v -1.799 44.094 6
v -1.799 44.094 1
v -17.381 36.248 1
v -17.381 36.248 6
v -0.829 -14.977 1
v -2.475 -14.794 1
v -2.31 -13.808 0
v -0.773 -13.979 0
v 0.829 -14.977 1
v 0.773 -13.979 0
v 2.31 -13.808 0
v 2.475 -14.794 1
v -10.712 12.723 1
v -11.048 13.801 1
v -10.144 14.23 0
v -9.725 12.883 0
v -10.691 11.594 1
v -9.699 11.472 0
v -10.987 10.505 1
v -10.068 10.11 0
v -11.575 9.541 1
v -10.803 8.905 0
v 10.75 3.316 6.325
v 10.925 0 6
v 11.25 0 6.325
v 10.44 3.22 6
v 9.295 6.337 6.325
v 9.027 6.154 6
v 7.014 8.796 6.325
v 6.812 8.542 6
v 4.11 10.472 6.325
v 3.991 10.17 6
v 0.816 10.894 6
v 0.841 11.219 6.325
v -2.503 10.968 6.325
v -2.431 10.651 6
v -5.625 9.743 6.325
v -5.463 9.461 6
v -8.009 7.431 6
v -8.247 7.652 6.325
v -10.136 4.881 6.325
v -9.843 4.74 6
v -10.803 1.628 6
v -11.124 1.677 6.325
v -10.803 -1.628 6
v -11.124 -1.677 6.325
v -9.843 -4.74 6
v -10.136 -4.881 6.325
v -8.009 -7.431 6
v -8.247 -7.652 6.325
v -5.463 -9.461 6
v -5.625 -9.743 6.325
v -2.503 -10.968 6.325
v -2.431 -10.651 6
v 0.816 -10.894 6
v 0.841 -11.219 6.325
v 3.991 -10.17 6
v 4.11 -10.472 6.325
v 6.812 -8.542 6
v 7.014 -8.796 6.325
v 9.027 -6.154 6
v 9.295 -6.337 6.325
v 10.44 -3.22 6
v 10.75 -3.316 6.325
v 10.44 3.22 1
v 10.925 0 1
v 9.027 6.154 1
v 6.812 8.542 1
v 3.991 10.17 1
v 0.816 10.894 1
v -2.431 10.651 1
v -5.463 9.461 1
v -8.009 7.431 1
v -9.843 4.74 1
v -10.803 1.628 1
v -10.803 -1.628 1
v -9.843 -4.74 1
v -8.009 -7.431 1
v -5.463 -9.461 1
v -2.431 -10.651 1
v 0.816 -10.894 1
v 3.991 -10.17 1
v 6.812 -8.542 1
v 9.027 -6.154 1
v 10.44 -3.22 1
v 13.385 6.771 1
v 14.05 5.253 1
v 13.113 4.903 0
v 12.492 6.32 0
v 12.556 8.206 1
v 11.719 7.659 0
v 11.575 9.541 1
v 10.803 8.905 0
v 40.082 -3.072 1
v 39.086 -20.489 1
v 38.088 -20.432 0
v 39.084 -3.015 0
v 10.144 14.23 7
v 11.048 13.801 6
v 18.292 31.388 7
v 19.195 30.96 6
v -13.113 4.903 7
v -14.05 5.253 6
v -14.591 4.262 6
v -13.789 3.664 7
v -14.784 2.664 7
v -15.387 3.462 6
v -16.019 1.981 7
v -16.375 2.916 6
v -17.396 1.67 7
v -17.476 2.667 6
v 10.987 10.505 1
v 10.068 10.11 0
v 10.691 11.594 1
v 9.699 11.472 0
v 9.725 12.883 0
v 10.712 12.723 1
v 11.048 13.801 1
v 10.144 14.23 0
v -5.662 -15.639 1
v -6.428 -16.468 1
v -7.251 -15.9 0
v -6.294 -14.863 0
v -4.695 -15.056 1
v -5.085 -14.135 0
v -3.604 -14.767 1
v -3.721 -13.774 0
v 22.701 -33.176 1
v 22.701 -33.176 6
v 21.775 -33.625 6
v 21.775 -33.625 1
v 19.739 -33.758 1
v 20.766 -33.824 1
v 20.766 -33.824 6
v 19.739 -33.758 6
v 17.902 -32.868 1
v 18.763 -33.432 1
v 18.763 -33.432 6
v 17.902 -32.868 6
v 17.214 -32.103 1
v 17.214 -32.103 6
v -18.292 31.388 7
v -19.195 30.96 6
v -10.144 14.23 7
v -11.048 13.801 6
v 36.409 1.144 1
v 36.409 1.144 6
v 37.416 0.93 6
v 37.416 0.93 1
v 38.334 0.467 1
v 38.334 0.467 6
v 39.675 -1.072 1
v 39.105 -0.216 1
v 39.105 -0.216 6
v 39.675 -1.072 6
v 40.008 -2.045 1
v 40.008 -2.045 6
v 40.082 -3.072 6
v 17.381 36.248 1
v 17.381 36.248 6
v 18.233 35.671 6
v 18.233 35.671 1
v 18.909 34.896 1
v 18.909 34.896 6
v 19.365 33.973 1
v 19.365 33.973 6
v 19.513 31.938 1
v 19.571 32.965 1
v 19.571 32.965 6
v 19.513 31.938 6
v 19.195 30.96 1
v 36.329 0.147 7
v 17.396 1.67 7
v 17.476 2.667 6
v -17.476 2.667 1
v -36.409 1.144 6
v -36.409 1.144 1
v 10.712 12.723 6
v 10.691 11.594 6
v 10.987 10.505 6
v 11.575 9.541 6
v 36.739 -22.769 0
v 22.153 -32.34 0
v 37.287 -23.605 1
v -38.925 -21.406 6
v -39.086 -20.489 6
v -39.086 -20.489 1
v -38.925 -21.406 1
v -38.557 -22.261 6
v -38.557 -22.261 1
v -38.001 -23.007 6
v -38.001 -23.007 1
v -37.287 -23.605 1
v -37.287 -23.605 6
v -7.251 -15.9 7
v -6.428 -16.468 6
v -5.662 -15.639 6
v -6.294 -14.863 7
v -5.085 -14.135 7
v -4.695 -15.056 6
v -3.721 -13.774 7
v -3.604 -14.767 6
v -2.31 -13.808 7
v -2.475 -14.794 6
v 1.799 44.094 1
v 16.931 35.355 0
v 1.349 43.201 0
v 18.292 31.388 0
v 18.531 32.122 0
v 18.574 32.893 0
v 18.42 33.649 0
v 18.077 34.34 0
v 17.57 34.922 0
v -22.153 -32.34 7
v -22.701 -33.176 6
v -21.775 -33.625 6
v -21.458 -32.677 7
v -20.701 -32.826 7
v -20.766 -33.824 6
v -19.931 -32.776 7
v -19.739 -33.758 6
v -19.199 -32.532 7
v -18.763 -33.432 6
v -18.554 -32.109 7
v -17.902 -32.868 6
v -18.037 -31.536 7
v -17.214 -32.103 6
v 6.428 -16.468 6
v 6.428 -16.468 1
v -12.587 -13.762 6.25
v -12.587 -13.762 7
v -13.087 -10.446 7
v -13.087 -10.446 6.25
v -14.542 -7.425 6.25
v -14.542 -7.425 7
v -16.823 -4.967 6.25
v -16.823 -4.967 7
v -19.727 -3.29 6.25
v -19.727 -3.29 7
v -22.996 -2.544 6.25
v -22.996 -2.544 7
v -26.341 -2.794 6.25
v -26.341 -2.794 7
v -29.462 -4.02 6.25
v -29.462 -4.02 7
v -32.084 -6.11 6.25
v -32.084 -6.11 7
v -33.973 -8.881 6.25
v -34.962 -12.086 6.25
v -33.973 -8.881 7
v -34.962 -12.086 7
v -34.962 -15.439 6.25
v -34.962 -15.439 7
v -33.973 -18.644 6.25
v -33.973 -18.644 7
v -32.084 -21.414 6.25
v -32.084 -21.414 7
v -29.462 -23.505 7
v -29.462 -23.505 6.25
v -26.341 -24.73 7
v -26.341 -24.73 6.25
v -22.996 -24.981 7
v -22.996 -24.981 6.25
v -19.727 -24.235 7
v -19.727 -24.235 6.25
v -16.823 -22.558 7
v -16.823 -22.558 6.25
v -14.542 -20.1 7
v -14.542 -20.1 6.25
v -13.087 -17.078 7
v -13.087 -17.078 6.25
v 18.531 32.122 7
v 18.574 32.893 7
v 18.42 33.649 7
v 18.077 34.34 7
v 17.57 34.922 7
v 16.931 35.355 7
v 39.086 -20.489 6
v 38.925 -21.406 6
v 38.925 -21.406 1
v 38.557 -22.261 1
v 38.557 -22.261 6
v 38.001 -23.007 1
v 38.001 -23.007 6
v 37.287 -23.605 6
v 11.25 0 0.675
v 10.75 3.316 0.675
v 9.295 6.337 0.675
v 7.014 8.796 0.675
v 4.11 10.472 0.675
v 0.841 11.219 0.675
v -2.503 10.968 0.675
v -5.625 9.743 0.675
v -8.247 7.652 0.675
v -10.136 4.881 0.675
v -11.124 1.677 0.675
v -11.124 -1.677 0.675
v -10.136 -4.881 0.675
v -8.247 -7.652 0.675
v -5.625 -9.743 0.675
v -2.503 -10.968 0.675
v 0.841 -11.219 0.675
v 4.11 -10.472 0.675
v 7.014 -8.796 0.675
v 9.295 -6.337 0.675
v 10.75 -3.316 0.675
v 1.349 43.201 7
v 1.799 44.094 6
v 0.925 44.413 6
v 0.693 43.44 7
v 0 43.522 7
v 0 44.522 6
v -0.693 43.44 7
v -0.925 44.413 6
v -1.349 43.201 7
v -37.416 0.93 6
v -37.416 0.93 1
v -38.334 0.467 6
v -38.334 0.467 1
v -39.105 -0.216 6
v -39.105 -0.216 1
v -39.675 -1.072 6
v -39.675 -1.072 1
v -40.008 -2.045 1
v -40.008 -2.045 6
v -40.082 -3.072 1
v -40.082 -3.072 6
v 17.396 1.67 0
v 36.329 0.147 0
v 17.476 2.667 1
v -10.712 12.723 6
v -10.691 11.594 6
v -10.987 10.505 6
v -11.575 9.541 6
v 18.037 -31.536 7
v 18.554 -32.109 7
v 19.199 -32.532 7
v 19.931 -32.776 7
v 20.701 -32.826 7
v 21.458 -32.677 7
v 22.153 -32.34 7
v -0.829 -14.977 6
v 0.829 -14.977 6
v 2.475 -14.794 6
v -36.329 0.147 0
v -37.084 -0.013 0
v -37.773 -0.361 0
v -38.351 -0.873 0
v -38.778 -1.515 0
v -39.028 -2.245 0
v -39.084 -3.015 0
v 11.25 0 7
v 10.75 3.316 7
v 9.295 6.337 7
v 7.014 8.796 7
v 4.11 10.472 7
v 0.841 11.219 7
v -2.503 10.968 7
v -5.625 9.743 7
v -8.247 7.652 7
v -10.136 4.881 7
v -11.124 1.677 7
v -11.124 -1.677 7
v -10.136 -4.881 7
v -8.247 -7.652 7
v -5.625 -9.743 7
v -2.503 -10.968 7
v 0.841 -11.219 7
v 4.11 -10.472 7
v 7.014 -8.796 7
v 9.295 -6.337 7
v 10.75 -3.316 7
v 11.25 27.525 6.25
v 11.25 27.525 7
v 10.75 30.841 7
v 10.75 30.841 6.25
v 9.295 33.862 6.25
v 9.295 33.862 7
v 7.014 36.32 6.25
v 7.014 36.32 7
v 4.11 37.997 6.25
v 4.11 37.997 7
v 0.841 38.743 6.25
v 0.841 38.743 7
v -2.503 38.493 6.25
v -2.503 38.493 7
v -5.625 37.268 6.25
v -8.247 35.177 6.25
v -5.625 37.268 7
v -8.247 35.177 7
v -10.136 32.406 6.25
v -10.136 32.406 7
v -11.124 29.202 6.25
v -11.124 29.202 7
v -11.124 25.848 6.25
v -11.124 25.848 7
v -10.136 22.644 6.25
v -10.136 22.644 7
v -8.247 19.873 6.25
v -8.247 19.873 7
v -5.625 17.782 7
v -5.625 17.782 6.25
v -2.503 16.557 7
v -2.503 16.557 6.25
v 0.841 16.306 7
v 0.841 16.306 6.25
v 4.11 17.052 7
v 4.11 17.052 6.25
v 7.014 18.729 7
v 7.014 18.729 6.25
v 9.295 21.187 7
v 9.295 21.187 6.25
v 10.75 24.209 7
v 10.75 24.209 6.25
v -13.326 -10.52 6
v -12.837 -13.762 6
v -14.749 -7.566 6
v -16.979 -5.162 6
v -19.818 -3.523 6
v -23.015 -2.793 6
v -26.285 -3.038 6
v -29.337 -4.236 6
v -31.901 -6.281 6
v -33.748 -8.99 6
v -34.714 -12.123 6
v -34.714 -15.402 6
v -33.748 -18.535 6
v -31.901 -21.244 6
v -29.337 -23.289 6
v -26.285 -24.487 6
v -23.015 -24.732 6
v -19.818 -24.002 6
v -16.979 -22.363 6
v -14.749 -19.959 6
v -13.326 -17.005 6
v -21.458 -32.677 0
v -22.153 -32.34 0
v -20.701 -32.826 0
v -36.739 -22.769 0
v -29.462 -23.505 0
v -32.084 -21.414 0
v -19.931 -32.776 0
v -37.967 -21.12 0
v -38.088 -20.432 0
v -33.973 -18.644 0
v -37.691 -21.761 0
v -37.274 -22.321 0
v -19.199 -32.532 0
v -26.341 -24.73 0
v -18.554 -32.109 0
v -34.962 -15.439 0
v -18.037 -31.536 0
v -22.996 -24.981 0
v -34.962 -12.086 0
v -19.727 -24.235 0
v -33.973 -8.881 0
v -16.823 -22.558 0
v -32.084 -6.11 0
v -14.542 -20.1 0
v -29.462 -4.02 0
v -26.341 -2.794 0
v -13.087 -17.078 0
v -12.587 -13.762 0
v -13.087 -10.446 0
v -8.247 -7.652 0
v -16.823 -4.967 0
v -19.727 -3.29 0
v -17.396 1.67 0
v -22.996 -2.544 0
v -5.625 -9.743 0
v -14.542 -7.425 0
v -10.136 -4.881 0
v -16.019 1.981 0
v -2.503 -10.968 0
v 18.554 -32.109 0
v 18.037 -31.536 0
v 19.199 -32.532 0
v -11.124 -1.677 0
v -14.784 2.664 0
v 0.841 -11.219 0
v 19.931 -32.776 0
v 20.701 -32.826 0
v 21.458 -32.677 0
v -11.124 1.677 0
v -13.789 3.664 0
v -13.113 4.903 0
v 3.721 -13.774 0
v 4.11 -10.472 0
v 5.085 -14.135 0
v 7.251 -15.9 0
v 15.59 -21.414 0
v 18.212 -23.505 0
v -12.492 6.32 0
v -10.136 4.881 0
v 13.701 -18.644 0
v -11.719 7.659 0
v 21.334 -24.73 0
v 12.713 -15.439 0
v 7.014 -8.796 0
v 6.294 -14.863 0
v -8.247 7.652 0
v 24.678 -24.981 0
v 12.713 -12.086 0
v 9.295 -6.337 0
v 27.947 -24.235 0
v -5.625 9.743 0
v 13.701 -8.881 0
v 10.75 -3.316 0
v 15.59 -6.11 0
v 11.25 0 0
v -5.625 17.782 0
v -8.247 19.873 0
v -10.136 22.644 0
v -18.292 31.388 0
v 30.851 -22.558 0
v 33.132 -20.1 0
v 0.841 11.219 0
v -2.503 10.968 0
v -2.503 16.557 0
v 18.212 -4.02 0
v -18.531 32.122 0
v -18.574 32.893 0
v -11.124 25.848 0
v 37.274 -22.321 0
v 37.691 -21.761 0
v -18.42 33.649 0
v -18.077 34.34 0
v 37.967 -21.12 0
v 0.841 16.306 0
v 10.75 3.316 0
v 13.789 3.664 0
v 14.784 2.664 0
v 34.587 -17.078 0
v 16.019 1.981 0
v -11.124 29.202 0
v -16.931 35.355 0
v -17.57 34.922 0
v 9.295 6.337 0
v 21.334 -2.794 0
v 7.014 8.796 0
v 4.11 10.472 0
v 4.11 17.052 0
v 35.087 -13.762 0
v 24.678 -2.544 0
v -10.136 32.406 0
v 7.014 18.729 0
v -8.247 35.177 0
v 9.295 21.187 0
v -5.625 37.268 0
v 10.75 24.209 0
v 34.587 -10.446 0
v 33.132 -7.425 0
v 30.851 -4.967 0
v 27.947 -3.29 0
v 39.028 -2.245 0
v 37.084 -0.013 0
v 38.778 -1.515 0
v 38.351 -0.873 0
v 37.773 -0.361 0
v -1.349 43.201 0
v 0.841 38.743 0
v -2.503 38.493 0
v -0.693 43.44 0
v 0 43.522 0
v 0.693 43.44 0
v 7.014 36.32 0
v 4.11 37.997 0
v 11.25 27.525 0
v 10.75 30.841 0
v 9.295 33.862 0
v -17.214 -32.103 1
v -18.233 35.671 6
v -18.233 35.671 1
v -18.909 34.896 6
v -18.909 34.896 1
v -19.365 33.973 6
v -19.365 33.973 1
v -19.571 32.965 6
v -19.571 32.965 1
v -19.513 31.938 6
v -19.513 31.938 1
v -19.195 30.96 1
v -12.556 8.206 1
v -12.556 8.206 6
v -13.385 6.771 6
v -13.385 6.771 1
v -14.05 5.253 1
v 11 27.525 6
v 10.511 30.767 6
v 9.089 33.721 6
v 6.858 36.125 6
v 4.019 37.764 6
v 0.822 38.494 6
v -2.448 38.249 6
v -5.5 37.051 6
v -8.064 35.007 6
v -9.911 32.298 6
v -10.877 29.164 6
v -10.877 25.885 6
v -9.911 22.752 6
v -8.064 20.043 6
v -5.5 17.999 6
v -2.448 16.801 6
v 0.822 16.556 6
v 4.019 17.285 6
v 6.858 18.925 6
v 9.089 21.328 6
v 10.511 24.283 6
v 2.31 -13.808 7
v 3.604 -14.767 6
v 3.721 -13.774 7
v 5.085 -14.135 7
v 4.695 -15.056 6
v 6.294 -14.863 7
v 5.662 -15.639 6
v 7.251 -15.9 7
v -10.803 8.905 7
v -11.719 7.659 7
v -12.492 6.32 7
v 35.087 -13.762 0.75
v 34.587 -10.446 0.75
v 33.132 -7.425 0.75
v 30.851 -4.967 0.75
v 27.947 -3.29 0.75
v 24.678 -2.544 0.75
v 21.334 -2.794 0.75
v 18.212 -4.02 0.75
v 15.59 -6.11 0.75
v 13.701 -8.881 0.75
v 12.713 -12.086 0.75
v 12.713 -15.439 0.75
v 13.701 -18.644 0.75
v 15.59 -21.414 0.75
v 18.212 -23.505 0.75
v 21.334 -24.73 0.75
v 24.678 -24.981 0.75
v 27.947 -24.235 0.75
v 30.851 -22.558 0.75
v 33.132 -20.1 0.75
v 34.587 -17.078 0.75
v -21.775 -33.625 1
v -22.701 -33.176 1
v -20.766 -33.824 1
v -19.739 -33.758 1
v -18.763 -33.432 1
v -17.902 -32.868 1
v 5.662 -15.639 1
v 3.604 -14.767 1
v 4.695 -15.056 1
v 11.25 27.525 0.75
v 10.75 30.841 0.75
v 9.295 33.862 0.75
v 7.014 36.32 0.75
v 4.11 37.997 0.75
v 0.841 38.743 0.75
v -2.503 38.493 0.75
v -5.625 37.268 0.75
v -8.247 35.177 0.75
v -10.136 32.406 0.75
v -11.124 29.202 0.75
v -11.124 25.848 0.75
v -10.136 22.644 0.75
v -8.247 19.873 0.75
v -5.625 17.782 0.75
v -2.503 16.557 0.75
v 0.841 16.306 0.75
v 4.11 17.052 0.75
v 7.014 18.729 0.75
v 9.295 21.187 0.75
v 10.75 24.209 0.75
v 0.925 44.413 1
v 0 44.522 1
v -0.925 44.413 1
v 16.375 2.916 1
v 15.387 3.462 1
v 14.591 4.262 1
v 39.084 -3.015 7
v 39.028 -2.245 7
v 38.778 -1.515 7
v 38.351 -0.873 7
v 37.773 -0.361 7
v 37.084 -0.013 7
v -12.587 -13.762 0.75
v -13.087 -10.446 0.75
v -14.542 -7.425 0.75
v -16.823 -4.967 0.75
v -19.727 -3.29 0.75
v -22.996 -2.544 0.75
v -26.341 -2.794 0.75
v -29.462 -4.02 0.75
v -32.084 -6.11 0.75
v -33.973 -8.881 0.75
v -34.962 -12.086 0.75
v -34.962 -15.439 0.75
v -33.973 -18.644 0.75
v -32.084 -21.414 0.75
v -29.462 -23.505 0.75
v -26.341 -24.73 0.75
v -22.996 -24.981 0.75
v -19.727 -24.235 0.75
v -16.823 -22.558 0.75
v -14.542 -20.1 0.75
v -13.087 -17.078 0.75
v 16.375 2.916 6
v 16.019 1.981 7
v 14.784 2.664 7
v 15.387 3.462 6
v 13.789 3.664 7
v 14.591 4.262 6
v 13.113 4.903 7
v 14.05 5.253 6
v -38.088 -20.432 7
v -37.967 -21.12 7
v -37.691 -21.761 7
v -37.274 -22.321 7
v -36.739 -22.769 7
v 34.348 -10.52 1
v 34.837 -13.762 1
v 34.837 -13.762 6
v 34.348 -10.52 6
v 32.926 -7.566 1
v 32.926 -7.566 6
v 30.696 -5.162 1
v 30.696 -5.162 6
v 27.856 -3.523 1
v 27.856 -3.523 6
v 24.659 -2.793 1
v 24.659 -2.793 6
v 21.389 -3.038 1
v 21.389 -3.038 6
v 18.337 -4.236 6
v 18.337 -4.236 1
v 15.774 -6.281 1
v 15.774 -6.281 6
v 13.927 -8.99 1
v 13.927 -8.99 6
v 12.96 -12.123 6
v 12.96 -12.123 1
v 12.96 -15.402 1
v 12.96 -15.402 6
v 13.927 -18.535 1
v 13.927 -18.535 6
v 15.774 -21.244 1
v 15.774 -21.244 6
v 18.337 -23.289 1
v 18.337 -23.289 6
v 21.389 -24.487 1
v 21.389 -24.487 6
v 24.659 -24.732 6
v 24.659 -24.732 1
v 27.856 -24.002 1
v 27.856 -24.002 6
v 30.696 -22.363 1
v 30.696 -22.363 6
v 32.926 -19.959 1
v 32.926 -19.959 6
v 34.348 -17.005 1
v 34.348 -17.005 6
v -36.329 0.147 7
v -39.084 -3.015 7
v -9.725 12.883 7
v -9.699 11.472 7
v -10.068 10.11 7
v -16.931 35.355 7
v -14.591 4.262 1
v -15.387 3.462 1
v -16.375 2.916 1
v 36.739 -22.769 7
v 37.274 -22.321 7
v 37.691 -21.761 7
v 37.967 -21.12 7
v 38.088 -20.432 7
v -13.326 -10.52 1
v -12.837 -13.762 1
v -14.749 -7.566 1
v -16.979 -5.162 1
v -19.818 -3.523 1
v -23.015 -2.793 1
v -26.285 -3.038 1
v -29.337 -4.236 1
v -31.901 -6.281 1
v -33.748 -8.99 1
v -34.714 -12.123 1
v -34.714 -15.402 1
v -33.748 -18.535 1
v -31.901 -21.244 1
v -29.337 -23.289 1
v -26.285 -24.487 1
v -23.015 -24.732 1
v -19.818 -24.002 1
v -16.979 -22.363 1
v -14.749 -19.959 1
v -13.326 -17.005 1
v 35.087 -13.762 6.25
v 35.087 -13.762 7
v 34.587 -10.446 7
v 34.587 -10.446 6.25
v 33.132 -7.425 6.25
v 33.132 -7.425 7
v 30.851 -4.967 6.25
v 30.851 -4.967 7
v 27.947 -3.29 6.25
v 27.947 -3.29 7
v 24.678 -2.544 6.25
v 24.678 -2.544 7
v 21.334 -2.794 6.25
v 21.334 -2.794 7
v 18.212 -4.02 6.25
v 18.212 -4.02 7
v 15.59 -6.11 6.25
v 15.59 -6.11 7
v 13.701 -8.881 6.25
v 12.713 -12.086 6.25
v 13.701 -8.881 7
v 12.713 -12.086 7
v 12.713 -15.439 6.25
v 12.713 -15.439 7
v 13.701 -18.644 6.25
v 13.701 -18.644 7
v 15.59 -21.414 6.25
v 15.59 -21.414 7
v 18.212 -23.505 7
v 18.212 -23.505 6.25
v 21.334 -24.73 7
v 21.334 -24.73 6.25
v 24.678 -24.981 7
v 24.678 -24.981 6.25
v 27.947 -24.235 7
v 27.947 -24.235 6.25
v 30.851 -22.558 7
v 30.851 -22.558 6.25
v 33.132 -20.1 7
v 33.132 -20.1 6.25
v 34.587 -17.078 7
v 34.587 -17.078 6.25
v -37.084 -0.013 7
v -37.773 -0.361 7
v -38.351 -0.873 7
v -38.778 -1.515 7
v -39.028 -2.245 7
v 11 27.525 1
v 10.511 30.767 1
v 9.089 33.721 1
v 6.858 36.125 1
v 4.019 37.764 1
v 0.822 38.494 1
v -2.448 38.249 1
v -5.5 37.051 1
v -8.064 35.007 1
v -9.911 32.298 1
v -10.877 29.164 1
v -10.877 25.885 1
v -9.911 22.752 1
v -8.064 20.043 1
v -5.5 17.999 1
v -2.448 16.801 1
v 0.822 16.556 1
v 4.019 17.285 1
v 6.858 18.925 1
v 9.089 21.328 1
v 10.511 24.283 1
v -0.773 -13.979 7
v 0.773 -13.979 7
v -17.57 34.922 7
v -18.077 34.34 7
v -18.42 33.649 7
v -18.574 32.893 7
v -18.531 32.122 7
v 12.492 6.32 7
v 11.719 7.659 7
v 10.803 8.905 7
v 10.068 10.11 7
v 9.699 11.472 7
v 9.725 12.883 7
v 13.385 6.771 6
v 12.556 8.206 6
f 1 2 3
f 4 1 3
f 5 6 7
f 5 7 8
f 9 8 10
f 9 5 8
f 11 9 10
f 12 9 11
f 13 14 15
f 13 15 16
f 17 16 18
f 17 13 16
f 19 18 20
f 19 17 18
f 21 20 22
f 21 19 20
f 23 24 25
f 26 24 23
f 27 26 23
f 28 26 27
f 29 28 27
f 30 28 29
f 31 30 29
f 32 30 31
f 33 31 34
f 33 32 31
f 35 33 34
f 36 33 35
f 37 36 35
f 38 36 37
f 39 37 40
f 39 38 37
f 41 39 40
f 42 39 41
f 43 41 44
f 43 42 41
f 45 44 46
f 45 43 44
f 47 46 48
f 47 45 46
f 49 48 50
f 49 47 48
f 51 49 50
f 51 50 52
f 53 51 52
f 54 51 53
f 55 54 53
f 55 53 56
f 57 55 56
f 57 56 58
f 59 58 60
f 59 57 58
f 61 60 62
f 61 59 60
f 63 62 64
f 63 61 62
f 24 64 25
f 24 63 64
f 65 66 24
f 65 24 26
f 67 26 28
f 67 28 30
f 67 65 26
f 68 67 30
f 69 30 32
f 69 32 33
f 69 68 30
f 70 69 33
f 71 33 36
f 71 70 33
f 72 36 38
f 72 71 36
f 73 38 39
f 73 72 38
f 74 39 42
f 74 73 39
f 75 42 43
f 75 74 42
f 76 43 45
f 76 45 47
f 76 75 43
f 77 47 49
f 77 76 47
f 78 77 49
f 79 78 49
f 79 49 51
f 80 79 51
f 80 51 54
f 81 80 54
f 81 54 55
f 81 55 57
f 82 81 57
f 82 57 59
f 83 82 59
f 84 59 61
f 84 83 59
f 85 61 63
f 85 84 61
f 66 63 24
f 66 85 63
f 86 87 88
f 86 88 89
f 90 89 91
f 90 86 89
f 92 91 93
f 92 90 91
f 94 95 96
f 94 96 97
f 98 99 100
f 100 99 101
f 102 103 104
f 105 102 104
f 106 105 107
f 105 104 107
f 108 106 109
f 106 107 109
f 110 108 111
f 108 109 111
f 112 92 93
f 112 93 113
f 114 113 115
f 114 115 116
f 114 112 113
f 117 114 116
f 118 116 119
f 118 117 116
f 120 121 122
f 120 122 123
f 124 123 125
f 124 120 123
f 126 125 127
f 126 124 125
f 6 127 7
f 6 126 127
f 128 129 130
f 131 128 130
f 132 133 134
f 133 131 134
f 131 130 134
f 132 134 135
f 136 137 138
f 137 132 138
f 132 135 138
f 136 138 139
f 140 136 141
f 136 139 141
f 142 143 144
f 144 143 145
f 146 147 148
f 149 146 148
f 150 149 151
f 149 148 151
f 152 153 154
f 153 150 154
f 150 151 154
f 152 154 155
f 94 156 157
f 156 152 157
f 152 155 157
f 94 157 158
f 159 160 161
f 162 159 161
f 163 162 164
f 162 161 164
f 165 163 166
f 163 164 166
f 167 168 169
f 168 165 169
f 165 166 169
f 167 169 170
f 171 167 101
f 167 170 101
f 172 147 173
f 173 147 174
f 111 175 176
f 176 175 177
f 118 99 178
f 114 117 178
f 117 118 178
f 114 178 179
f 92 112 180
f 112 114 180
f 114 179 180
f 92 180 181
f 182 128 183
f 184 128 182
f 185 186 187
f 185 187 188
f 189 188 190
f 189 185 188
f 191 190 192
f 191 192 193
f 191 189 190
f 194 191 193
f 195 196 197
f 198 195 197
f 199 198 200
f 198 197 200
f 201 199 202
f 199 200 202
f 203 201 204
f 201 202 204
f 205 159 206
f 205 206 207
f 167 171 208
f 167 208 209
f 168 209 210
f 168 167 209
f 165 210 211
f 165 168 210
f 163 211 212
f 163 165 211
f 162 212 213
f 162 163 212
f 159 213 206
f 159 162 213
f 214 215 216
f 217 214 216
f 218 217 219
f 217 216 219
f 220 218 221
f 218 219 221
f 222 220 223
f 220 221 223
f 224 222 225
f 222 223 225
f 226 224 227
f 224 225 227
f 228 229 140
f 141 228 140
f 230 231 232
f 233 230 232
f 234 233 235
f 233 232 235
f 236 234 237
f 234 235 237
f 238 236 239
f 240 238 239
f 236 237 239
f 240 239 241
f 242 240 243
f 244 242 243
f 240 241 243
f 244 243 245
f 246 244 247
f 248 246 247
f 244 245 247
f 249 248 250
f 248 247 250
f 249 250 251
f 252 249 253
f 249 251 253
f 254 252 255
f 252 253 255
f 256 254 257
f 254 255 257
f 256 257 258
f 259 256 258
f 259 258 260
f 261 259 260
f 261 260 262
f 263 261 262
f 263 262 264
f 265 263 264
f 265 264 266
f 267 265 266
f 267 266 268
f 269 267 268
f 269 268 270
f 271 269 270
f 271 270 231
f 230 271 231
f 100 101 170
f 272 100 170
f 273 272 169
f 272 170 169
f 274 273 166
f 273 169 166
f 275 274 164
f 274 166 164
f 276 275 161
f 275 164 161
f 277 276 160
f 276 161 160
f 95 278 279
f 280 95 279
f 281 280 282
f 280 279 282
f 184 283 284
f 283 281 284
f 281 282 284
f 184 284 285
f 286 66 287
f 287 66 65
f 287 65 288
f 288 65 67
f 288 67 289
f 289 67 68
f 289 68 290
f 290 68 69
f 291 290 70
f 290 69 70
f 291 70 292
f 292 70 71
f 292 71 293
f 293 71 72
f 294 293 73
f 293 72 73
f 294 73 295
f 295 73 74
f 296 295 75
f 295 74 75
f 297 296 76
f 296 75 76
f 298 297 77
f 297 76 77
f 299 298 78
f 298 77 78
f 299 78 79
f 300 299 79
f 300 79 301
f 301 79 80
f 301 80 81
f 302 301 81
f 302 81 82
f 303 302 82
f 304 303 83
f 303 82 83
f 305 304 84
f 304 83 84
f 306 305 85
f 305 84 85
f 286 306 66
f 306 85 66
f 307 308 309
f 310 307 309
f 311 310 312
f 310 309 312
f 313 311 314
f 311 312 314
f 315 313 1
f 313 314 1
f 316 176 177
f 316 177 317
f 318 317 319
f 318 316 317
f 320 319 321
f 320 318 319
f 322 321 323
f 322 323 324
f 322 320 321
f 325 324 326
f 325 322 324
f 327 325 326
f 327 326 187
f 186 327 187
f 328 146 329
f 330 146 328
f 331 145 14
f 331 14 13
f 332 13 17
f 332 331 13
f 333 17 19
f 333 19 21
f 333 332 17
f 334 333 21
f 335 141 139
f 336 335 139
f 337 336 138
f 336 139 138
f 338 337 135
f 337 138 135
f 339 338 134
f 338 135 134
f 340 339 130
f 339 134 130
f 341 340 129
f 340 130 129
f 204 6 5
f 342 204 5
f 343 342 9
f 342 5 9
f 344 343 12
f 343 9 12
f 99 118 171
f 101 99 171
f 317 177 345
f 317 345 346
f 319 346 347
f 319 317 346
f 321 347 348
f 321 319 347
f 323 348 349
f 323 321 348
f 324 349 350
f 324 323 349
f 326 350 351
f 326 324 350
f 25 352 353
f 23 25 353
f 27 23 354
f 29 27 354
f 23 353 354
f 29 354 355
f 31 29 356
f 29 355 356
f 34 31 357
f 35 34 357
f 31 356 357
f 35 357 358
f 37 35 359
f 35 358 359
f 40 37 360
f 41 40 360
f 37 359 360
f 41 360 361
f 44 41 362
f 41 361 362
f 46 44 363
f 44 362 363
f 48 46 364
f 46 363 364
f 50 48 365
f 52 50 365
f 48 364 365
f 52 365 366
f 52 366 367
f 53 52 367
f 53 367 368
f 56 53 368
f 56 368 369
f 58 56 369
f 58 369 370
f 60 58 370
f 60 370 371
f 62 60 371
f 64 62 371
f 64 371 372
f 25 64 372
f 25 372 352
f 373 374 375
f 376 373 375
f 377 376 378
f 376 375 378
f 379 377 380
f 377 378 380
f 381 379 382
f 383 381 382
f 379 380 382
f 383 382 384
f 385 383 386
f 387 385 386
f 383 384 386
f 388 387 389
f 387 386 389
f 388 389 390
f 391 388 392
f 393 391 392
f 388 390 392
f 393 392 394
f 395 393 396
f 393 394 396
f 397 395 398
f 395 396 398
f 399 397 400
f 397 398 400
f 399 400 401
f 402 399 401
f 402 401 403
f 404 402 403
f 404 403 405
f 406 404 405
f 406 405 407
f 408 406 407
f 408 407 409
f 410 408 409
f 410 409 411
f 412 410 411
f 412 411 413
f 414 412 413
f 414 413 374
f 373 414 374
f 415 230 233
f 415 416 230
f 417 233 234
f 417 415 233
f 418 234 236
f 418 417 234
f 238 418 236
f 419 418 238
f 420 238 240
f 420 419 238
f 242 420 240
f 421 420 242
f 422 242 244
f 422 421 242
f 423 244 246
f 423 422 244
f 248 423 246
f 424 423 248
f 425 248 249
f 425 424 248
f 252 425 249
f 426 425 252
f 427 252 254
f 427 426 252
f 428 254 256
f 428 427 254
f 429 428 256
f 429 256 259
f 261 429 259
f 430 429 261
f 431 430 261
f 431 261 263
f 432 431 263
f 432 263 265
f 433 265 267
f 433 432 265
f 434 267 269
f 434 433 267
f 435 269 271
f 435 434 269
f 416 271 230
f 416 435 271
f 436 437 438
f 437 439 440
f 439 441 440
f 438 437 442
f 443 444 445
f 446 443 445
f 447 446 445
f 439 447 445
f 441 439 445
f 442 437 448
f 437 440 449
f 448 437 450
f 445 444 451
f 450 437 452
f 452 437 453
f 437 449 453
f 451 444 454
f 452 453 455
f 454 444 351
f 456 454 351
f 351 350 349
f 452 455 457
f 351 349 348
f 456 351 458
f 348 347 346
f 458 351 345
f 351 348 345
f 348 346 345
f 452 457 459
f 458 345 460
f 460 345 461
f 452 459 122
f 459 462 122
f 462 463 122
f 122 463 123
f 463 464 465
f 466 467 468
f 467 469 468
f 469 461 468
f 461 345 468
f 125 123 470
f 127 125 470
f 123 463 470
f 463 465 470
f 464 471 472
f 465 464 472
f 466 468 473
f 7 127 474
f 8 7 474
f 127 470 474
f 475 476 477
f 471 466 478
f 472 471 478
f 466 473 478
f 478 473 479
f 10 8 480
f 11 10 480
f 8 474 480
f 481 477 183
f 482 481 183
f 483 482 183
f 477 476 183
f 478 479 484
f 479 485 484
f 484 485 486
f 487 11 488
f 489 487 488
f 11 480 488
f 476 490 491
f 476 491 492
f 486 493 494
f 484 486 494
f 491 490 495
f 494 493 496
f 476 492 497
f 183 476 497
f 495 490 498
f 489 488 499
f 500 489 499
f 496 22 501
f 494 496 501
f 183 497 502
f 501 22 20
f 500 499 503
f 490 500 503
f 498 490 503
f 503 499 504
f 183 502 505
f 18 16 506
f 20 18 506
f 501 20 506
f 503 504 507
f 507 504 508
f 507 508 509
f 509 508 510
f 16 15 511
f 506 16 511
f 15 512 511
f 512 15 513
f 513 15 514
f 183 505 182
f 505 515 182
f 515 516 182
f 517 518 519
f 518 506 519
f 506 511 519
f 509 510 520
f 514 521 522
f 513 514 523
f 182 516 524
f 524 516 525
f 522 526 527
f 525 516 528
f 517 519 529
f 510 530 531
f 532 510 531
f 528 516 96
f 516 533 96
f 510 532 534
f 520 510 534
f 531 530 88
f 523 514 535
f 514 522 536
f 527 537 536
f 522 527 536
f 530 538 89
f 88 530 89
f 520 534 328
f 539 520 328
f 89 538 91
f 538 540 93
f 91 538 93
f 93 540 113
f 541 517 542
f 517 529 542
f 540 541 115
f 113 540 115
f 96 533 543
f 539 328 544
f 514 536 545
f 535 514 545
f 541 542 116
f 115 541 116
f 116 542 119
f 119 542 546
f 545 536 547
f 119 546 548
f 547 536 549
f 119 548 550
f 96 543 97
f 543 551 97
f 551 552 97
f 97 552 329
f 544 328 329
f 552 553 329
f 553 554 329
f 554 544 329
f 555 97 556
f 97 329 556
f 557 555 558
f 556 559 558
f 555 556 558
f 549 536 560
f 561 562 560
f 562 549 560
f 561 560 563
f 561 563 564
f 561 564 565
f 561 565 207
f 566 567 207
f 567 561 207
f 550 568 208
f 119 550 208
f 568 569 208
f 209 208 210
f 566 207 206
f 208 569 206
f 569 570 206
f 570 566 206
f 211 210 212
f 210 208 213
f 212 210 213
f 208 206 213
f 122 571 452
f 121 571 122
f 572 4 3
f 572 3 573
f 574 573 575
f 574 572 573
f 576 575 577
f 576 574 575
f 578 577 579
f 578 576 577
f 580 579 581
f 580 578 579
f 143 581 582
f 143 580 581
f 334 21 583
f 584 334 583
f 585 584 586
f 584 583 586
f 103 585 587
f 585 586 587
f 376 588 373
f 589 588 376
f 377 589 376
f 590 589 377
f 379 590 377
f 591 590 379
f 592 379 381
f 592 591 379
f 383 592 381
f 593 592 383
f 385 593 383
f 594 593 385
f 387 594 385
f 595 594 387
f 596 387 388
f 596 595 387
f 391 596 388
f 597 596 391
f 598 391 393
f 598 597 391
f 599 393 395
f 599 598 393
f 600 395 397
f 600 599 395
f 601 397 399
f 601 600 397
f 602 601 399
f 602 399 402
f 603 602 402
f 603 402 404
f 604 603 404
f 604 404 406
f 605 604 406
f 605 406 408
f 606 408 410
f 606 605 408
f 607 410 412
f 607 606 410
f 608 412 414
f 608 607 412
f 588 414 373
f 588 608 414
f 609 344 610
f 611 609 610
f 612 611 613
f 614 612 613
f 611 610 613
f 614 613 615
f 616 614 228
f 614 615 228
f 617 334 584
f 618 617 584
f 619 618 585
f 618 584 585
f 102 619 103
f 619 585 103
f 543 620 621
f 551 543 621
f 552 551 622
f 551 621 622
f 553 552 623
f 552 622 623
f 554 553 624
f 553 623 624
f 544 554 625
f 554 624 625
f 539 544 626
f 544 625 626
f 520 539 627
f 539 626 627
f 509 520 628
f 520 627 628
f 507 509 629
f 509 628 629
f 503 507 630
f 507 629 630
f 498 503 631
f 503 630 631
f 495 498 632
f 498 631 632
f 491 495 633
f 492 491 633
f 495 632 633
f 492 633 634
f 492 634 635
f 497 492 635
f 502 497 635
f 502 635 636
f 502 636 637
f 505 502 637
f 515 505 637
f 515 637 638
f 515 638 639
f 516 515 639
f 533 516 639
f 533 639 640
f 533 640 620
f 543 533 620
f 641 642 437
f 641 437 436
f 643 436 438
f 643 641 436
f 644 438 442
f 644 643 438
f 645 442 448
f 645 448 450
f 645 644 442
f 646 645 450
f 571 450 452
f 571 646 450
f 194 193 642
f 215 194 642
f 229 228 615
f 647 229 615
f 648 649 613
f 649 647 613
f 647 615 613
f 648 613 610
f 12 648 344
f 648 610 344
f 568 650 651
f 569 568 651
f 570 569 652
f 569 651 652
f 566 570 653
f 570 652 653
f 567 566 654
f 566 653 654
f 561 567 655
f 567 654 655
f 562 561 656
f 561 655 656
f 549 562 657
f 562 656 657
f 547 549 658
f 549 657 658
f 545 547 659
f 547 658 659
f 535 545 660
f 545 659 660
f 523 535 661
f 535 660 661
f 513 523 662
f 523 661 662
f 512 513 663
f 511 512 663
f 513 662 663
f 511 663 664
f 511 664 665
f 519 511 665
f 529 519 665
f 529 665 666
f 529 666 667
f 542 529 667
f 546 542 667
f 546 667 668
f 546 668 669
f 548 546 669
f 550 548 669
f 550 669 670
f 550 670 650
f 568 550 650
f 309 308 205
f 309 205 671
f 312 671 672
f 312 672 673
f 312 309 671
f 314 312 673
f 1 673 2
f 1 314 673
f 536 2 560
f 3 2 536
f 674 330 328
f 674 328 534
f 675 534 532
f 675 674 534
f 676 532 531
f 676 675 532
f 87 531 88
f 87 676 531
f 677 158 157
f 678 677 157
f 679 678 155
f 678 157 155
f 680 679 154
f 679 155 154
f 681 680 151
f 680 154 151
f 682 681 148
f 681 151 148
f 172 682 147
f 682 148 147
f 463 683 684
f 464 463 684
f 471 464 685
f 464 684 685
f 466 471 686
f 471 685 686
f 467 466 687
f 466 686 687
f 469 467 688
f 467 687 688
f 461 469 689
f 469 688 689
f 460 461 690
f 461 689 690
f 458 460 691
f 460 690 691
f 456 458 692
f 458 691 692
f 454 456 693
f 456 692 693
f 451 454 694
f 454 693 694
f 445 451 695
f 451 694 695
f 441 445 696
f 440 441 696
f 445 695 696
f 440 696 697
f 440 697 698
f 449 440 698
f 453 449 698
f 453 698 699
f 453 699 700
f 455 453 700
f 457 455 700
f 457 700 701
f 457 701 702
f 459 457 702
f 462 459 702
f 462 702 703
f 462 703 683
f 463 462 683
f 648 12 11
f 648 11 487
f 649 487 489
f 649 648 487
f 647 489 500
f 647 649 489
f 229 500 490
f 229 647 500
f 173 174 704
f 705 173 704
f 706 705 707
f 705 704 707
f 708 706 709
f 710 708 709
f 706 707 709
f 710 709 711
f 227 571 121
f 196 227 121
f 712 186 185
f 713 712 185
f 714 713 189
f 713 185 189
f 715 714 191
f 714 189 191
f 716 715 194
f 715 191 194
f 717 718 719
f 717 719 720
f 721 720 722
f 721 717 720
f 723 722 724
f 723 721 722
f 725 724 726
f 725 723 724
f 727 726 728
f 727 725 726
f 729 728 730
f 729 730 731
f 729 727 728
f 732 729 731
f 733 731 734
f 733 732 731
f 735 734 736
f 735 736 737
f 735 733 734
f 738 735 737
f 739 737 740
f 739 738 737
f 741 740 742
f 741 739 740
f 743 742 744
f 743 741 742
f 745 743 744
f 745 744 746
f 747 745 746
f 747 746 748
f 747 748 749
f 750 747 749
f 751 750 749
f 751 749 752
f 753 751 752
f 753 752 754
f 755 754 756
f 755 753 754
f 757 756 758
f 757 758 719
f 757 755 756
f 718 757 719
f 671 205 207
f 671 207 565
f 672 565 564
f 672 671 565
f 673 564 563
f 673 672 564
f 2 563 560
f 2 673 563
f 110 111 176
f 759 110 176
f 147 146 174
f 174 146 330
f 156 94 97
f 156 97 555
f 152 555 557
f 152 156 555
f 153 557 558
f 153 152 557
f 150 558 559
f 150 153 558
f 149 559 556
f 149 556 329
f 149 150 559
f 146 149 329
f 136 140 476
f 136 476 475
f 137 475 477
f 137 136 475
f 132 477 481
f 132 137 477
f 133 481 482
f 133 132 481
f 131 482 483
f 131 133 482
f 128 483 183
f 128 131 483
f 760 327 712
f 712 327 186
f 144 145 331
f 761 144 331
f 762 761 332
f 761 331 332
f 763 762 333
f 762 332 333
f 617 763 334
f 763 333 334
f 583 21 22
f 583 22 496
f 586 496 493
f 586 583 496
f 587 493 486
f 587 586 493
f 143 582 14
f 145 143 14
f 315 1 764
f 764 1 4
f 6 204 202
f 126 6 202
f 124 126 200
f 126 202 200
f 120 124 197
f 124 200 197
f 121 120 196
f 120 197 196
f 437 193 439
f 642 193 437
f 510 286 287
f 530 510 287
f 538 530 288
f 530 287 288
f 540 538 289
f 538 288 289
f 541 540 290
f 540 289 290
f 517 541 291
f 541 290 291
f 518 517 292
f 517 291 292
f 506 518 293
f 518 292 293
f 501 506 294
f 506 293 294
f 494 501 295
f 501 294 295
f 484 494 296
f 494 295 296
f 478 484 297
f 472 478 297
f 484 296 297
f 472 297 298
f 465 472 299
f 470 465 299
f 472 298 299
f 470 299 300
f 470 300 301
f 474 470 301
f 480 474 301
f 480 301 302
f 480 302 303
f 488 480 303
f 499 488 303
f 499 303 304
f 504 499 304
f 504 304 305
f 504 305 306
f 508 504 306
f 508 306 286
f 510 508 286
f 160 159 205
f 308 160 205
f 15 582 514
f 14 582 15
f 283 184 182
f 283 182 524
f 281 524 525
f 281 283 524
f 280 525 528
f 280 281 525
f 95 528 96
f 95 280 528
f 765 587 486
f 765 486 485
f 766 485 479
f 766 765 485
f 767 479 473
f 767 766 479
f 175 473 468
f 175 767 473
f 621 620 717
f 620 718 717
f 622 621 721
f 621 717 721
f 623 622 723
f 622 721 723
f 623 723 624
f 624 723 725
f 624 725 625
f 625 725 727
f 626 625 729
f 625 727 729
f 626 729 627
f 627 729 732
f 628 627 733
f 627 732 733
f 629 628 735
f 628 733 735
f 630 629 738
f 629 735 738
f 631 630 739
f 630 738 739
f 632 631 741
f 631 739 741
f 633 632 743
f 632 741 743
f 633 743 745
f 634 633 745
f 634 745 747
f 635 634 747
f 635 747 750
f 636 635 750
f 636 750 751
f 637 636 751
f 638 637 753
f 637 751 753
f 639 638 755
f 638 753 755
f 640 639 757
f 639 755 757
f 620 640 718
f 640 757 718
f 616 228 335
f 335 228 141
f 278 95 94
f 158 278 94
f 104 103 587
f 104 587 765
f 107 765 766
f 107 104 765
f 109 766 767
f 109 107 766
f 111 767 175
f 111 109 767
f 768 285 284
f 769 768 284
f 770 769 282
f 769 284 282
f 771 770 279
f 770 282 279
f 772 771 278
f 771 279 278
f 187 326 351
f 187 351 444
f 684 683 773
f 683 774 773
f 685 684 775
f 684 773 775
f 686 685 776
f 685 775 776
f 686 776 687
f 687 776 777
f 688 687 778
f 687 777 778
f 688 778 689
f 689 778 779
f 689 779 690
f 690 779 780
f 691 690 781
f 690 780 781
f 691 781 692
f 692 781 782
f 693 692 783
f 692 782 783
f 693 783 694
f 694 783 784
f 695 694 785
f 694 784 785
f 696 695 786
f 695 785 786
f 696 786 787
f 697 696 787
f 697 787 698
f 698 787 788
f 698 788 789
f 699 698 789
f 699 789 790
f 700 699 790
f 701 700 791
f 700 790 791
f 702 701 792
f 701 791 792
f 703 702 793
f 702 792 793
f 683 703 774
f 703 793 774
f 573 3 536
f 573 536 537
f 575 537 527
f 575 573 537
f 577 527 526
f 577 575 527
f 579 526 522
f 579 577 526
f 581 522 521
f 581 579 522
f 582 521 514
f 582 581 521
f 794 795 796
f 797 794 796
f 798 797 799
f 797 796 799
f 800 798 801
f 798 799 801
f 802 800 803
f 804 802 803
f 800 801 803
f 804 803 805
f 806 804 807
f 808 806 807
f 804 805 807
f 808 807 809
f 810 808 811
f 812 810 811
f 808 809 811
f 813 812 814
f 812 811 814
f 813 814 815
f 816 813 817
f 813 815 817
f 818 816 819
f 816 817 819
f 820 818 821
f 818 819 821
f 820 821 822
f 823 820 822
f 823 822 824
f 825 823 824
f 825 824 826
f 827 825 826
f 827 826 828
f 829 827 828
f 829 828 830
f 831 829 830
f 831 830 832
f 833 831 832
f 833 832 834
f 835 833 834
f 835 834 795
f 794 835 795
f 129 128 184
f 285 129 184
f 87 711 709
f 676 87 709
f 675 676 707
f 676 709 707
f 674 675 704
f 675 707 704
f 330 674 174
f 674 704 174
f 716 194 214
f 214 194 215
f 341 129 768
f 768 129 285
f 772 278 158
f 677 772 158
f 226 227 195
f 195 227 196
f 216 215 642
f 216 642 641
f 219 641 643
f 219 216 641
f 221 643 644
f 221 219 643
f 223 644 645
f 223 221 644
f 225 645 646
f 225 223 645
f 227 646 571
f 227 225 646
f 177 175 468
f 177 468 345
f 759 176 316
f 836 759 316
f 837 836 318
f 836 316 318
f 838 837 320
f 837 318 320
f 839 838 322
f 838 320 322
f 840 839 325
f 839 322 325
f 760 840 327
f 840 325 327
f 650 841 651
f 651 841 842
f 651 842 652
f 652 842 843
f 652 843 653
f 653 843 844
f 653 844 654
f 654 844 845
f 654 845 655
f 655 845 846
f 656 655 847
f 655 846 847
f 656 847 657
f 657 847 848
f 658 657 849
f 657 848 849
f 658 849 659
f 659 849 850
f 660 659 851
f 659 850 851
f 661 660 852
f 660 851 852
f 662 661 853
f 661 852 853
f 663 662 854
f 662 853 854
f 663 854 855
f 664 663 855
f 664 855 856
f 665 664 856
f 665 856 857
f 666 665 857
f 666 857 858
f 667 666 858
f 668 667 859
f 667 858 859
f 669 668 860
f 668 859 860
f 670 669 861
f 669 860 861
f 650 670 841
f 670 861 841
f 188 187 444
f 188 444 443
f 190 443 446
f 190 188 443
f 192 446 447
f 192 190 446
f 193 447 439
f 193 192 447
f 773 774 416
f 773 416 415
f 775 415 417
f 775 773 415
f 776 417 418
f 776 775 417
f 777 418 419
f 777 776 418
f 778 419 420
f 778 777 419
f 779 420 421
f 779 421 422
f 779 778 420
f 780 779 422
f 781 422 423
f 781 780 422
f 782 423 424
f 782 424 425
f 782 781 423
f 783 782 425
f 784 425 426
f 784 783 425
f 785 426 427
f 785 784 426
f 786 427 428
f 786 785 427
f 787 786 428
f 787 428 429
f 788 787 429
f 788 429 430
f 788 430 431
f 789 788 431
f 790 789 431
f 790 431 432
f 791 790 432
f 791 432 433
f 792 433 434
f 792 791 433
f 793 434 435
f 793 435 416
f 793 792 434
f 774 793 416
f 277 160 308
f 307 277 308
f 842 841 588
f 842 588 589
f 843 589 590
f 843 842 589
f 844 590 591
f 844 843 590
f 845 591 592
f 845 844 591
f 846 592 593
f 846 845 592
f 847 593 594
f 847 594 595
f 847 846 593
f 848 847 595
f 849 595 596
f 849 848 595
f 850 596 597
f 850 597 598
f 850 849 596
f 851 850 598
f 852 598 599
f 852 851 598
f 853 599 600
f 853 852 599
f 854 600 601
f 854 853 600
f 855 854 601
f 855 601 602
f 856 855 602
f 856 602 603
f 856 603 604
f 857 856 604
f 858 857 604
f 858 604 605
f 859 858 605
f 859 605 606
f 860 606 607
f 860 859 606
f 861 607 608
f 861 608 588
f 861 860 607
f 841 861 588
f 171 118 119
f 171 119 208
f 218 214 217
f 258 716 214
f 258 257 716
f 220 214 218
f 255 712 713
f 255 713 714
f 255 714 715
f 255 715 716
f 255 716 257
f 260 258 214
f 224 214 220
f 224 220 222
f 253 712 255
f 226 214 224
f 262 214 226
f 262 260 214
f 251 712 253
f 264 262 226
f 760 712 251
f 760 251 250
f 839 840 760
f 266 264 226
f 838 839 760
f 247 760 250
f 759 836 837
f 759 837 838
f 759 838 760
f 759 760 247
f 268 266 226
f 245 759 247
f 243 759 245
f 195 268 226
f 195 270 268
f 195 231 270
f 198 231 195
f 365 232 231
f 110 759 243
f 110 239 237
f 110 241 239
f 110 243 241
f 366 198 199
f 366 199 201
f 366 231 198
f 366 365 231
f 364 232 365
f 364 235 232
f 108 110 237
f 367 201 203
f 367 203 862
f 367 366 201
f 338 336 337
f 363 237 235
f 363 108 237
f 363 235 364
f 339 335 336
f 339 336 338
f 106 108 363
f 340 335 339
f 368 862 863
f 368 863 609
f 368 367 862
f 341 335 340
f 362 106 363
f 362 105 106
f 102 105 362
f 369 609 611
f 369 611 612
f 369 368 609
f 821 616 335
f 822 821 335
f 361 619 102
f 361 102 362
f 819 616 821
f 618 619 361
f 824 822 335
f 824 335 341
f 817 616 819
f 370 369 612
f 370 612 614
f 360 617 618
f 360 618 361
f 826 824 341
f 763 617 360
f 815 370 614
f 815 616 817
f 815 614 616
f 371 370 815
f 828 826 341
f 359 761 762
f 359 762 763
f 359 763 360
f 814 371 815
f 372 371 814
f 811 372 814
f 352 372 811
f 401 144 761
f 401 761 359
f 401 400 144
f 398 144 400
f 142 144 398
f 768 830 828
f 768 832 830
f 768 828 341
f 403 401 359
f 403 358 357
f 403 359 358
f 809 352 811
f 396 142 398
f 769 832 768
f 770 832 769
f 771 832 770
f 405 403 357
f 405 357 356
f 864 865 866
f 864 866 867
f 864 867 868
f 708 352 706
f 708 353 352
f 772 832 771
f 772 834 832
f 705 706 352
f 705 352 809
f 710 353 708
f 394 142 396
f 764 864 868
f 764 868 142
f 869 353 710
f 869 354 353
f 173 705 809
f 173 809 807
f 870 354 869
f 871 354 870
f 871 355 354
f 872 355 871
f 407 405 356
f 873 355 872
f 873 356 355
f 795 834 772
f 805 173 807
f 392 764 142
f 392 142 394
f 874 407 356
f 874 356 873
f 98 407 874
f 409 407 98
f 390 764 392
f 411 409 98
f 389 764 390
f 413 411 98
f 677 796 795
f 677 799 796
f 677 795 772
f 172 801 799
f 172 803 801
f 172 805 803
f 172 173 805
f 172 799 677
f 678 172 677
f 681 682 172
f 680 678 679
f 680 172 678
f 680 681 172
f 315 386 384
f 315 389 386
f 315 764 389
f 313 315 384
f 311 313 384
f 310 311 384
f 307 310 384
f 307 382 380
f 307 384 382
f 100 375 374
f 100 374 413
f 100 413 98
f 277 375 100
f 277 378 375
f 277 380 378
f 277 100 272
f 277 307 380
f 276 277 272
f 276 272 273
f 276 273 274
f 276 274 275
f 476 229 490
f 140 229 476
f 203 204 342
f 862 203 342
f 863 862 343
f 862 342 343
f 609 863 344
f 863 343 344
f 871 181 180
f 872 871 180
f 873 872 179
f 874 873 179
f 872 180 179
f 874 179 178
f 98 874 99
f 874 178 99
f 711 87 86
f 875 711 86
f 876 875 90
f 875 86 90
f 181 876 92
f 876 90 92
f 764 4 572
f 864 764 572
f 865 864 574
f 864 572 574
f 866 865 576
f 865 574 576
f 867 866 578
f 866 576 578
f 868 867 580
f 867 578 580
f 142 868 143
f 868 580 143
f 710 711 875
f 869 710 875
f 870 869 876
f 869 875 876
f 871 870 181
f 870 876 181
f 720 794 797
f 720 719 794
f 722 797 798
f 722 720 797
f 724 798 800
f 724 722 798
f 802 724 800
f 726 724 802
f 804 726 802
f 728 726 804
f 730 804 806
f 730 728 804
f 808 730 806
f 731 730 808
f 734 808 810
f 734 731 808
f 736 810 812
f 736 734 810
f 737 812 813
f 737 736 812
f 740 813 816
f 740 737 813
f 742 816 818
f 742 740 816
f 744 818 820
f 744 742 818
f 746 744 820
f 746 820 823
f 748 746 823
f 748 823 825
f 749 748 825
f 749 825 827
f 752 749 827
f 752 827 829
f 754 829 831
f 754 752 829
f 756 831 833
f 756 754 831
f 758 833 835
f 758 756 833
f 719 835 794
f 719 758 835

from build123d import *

# Parameters (mm, degrees)
F0_R     = 11
F0_R_2   = 10.925
F1_DEPTH = 7
F2_R     = 4
F3_SIZE  = 1
F4_R     = 11.925
F4_R_2   = 11.25
F4_R_3   = 12
F5_DEPTH = 7


# Not quite as in the source:
# - a feature names something its author has since deleted; it is built from what else it names


with BuildPart() as f1:
    # F0 (on Top) → F1 (new body)
    with BuildSketch(Plane.XY):
        with BuildLine():
            Line((20.8717118949, 34.490134567), (0, 45))
            Line((0, 45), (-20.8717118949, 34.490134567))
            Line((-20.8717118949, 34.490134567), (-9.8614735953, 11.3027137683))
            ThreePointArc((-9.8614735953, 11.3027137683), (0, 15), (9.8614735953, 11.3027137683))
            Line((9.8614735953, 11.3027137683), (20.8717118949, 34.490134567))
        make_face()
        with Locations((0, 27.5248214602)):
            Circle(F0_R, mode=Mode.SUBTRACT)
        with BuildLine():
            ThreePointArc((9.8614735953, 11.3027137683), (0, 15), (-9.8614735953, 11.3027137683))
            ThreePointArc((-9.8614735953, 11.3027137683), (-12.9903810568, 7.5), (-14.7191740527, 2.8889297681))
            ThreePointArc((-14.7191740527, 2.8889297681), (-12.9903810568, -7.5), (-4.8577004574, -14.1916435365))
            ThreePointArc((-4.8577004574, -14.1916435365), (0, -15), (4.8577004574, -14.1916435365))
            ThreePointArc((4.8577004574, -14.1916435365), (12.2038007781, -8.7216538896), (15, 0))
            ThreePointArc((15, 0), (14.9296284413, 1.4512734423), (14.7191740527, 2.8889297681))
            ThreePointArc((14.7191740527, 2.8889297681), (12.9903810568, 7.5), (9.8614735953, 11.3027137683))
        make_face()
        Circle(F0_R_2, mode=Mode.SUBTRACT)
        with BuildLine():
            ThreePointArc((-4.8577004574, -14.1916435365), (-12.9903810568, -7.5), (-14.7191740527, 2.8889297681))
            Line((-14.7191740527, 2.8889297681), (-40.3051886624, 0.8303654379))
            Line((-40.3051886624, 0.8303654379), (-38.9711431703, -22.5))
            Line((-38.9711431703, -22.5), (-19.4334767676, -35.3205000049))
            Line((-19.4334767676, -35.3205000049), (-4.8577004574, -14.1916435365))
        make_face()
        with Locations((-23.8371946192, -13.7624107301)):
            Circle(F0_R, mode=Mode.SUBTRACT)
        with BuildLine():
            Line((40.3051886624, 0.8303654379), (14.7191740527, 2.8889297681))
            ThreePointArc((14.7191740527, 2.8889297681), (14.9296284413, 1.4512734423), (15, 0))
            ThreePointArc((15, 0), (12.2038007781, -8.7216538896), (4.8577004574, -14.1916435365))
            Line((4.8577004574, -14.1916435365), (19.4334767676, -35.3205000049))
            Line((19.4334767676, -35.3205000049), (38.9711431703, -22.5))
            Line((38.9711431703, -22.5), (40.3051886624, 0.8303654379))
        make_face()
        with Locations((23.8371946192, -13.7624107301)):
            Circle(F0_R, mode=Mode.SUBTRACT)
    extrude(amount=F1_DEPTH)

    # F2
    f2_edges = [f1.edges().sort_by_distance(p)[0] for p in [
        (9.861474, 11.302714, 3.5),
        (-9.861474, 11.302714, 3.5),
        (14.719174, 2.88893, 3.5),
        (4.8577, -14.191644, 3.5),
        (-4.8577, -14.191644, 3.5),
        (-14.719174, 2.88893, 3.5),
        (20.871712, 34.490135, 3.5),
        (0, 45, 3.5),
        (-20.871712, 34.490135, 3.5),
        (19.433477, -35.3205, 3.5),
        (38.971143, -22.5, 3.5),
        (40.305189, 0.830365, 3.5),
        (-19.433477, -35.3205, 3.5),
        (-38.971143, -22.5, 3.5),
        (-40.305189, 0.830365, 3.5),
    ]]
    fillet(f2_edges, radius=F2_R)

    # F3
    f3_edges = [f1.edges().sort_by_distance(p)[0] for p in [
        (-15.121499, 22.38026, 7),
        (-15.121499, 22.38026, 0),
        (-39.584098, -11.780379, 7),
        (-29.994156, -28.390645, 7),
        (15.121499, 22.38026, 7),
        (10.691316, 11.594325, 7),
        (19.36544, 33.973357, 7),
        (12.990381, 7.5, 7),
        (9.589942, 40.171024, 7),
        (15.386638, 3.461789, 7),
        (0, 44.521503, 7),
        (26.942623, 1.905472, 7),
        (-9.589942, 40.171024, 7),
        (39.10451, -0.215715, 7),
        (-19.36544, 33.973357, 7),
        (39.584098, -11.780379, 7),
        (38.556753, -22.260751, 7),
        (-10.691316, 11.594325, 7),
        (29.994156, -28.390645, 7),
        (-12.990381, 7.5, 7),
        (19.73907, -33.757641, 7),
        (-15.386638, 3.461789, 7),
        (11.821124, -24.285733, 7),
        (-26.942623, 1.905472, 7),
        (4.695322, -15.056114, 7),
        (-39.10451, -0.215715, 7),
        (0, -15, 7),
        (-4.695322, -15.056114, 7),
        (-38.556753, -22.260751, 7),
        (-11.821124, -24.285733, 7),
        (-19.73907, -33.757641, 7),
        (-11, 27.524821, 7),
        (-10.925, 0, 7),
        (-34.837195, -13.762411, 7),
        (12.837195, -13.762411, 7),
        (15.121499, 22.38026, 0),
        (10.691316, 11.594325, 0),
        (19.36544, 33.973357, 0),
        (12.990381, 7.5, 0),
        (9.589942, 40.171024, 0),
        (15.386638, 3.461789, 0),
        (0, 44.521503, 0),
        (26.942623, 1.905472, 0),
        (-9.589942, 40.171024, 0),
        (39.10451, -0.215715, 0),
        (-19.36544, 33.973357, 0),
        (39.584098, -11.780379, 0),
        (38.556753, -22.260751, 0),
        (-10.691316, 11.594325, 0),
        (29.994156, -28.390645, 0),
        (-12.990381, 7.5, 0),
        (19.73907, -33.757641, 0),
        (-15.386638, 3.461789, 0),
        (11.821124, -24.285733, 0),
        (-26.942623, 1.905472, 0),
        (4.695322, -15.056114, 0),
        (-39.10451, -0.215715, 0),
        (0, -15, 0),
        (-39.584098, -11.780379, 0),
        (-4.695322, -15.056114, 0),
        (-38.556753, -22.260751, 0),
        (-11.821124, -24.285733, 0),
        (-29.994156, -28.390645, 0),
        (-19.73907, -33.757641, 0),
        (-11, 27.524821, 0),
        (-10.925, 0, 0),
        (-34.837195, -13.762411, 0),
        (12.837195, -13.762411, 0),
    ]]
    chamfer(f3_edges, length=F3_SIZE)

    # F4 (on face) → F5 (join)
    with BuildSketch(Plane.XY.offset(7)):
        Circle(F4_R)
        Circle(F4_R_2, mode=Mode.SUBTRACT)
        with Locations((0, 27.5248214602)):
            Circle(F4_R_3)
        with Locations((0, 27.5248214602)):
            Circle(F4_R_2, mode=Mode.SUBTRACT)
        with Locations((-23.8371946192, -13.7624107301)):
            Circle(F4_R_3)
        with Locations((-23.8371946192, -13.7624107301)):
            Circle(F4_R_2, mode=Mode.SUBTRACT)
        with Locations((23.8371946192, -13.7624107301)):
            Circle(F4_R_3)
        with Locations((23.8371946192, -13.7624107301)):
            Circle(F4_R_2, mode=Mode.SUBTRACT)
    extrude(amount=-F5_DEPTH)


solid = f1.part
